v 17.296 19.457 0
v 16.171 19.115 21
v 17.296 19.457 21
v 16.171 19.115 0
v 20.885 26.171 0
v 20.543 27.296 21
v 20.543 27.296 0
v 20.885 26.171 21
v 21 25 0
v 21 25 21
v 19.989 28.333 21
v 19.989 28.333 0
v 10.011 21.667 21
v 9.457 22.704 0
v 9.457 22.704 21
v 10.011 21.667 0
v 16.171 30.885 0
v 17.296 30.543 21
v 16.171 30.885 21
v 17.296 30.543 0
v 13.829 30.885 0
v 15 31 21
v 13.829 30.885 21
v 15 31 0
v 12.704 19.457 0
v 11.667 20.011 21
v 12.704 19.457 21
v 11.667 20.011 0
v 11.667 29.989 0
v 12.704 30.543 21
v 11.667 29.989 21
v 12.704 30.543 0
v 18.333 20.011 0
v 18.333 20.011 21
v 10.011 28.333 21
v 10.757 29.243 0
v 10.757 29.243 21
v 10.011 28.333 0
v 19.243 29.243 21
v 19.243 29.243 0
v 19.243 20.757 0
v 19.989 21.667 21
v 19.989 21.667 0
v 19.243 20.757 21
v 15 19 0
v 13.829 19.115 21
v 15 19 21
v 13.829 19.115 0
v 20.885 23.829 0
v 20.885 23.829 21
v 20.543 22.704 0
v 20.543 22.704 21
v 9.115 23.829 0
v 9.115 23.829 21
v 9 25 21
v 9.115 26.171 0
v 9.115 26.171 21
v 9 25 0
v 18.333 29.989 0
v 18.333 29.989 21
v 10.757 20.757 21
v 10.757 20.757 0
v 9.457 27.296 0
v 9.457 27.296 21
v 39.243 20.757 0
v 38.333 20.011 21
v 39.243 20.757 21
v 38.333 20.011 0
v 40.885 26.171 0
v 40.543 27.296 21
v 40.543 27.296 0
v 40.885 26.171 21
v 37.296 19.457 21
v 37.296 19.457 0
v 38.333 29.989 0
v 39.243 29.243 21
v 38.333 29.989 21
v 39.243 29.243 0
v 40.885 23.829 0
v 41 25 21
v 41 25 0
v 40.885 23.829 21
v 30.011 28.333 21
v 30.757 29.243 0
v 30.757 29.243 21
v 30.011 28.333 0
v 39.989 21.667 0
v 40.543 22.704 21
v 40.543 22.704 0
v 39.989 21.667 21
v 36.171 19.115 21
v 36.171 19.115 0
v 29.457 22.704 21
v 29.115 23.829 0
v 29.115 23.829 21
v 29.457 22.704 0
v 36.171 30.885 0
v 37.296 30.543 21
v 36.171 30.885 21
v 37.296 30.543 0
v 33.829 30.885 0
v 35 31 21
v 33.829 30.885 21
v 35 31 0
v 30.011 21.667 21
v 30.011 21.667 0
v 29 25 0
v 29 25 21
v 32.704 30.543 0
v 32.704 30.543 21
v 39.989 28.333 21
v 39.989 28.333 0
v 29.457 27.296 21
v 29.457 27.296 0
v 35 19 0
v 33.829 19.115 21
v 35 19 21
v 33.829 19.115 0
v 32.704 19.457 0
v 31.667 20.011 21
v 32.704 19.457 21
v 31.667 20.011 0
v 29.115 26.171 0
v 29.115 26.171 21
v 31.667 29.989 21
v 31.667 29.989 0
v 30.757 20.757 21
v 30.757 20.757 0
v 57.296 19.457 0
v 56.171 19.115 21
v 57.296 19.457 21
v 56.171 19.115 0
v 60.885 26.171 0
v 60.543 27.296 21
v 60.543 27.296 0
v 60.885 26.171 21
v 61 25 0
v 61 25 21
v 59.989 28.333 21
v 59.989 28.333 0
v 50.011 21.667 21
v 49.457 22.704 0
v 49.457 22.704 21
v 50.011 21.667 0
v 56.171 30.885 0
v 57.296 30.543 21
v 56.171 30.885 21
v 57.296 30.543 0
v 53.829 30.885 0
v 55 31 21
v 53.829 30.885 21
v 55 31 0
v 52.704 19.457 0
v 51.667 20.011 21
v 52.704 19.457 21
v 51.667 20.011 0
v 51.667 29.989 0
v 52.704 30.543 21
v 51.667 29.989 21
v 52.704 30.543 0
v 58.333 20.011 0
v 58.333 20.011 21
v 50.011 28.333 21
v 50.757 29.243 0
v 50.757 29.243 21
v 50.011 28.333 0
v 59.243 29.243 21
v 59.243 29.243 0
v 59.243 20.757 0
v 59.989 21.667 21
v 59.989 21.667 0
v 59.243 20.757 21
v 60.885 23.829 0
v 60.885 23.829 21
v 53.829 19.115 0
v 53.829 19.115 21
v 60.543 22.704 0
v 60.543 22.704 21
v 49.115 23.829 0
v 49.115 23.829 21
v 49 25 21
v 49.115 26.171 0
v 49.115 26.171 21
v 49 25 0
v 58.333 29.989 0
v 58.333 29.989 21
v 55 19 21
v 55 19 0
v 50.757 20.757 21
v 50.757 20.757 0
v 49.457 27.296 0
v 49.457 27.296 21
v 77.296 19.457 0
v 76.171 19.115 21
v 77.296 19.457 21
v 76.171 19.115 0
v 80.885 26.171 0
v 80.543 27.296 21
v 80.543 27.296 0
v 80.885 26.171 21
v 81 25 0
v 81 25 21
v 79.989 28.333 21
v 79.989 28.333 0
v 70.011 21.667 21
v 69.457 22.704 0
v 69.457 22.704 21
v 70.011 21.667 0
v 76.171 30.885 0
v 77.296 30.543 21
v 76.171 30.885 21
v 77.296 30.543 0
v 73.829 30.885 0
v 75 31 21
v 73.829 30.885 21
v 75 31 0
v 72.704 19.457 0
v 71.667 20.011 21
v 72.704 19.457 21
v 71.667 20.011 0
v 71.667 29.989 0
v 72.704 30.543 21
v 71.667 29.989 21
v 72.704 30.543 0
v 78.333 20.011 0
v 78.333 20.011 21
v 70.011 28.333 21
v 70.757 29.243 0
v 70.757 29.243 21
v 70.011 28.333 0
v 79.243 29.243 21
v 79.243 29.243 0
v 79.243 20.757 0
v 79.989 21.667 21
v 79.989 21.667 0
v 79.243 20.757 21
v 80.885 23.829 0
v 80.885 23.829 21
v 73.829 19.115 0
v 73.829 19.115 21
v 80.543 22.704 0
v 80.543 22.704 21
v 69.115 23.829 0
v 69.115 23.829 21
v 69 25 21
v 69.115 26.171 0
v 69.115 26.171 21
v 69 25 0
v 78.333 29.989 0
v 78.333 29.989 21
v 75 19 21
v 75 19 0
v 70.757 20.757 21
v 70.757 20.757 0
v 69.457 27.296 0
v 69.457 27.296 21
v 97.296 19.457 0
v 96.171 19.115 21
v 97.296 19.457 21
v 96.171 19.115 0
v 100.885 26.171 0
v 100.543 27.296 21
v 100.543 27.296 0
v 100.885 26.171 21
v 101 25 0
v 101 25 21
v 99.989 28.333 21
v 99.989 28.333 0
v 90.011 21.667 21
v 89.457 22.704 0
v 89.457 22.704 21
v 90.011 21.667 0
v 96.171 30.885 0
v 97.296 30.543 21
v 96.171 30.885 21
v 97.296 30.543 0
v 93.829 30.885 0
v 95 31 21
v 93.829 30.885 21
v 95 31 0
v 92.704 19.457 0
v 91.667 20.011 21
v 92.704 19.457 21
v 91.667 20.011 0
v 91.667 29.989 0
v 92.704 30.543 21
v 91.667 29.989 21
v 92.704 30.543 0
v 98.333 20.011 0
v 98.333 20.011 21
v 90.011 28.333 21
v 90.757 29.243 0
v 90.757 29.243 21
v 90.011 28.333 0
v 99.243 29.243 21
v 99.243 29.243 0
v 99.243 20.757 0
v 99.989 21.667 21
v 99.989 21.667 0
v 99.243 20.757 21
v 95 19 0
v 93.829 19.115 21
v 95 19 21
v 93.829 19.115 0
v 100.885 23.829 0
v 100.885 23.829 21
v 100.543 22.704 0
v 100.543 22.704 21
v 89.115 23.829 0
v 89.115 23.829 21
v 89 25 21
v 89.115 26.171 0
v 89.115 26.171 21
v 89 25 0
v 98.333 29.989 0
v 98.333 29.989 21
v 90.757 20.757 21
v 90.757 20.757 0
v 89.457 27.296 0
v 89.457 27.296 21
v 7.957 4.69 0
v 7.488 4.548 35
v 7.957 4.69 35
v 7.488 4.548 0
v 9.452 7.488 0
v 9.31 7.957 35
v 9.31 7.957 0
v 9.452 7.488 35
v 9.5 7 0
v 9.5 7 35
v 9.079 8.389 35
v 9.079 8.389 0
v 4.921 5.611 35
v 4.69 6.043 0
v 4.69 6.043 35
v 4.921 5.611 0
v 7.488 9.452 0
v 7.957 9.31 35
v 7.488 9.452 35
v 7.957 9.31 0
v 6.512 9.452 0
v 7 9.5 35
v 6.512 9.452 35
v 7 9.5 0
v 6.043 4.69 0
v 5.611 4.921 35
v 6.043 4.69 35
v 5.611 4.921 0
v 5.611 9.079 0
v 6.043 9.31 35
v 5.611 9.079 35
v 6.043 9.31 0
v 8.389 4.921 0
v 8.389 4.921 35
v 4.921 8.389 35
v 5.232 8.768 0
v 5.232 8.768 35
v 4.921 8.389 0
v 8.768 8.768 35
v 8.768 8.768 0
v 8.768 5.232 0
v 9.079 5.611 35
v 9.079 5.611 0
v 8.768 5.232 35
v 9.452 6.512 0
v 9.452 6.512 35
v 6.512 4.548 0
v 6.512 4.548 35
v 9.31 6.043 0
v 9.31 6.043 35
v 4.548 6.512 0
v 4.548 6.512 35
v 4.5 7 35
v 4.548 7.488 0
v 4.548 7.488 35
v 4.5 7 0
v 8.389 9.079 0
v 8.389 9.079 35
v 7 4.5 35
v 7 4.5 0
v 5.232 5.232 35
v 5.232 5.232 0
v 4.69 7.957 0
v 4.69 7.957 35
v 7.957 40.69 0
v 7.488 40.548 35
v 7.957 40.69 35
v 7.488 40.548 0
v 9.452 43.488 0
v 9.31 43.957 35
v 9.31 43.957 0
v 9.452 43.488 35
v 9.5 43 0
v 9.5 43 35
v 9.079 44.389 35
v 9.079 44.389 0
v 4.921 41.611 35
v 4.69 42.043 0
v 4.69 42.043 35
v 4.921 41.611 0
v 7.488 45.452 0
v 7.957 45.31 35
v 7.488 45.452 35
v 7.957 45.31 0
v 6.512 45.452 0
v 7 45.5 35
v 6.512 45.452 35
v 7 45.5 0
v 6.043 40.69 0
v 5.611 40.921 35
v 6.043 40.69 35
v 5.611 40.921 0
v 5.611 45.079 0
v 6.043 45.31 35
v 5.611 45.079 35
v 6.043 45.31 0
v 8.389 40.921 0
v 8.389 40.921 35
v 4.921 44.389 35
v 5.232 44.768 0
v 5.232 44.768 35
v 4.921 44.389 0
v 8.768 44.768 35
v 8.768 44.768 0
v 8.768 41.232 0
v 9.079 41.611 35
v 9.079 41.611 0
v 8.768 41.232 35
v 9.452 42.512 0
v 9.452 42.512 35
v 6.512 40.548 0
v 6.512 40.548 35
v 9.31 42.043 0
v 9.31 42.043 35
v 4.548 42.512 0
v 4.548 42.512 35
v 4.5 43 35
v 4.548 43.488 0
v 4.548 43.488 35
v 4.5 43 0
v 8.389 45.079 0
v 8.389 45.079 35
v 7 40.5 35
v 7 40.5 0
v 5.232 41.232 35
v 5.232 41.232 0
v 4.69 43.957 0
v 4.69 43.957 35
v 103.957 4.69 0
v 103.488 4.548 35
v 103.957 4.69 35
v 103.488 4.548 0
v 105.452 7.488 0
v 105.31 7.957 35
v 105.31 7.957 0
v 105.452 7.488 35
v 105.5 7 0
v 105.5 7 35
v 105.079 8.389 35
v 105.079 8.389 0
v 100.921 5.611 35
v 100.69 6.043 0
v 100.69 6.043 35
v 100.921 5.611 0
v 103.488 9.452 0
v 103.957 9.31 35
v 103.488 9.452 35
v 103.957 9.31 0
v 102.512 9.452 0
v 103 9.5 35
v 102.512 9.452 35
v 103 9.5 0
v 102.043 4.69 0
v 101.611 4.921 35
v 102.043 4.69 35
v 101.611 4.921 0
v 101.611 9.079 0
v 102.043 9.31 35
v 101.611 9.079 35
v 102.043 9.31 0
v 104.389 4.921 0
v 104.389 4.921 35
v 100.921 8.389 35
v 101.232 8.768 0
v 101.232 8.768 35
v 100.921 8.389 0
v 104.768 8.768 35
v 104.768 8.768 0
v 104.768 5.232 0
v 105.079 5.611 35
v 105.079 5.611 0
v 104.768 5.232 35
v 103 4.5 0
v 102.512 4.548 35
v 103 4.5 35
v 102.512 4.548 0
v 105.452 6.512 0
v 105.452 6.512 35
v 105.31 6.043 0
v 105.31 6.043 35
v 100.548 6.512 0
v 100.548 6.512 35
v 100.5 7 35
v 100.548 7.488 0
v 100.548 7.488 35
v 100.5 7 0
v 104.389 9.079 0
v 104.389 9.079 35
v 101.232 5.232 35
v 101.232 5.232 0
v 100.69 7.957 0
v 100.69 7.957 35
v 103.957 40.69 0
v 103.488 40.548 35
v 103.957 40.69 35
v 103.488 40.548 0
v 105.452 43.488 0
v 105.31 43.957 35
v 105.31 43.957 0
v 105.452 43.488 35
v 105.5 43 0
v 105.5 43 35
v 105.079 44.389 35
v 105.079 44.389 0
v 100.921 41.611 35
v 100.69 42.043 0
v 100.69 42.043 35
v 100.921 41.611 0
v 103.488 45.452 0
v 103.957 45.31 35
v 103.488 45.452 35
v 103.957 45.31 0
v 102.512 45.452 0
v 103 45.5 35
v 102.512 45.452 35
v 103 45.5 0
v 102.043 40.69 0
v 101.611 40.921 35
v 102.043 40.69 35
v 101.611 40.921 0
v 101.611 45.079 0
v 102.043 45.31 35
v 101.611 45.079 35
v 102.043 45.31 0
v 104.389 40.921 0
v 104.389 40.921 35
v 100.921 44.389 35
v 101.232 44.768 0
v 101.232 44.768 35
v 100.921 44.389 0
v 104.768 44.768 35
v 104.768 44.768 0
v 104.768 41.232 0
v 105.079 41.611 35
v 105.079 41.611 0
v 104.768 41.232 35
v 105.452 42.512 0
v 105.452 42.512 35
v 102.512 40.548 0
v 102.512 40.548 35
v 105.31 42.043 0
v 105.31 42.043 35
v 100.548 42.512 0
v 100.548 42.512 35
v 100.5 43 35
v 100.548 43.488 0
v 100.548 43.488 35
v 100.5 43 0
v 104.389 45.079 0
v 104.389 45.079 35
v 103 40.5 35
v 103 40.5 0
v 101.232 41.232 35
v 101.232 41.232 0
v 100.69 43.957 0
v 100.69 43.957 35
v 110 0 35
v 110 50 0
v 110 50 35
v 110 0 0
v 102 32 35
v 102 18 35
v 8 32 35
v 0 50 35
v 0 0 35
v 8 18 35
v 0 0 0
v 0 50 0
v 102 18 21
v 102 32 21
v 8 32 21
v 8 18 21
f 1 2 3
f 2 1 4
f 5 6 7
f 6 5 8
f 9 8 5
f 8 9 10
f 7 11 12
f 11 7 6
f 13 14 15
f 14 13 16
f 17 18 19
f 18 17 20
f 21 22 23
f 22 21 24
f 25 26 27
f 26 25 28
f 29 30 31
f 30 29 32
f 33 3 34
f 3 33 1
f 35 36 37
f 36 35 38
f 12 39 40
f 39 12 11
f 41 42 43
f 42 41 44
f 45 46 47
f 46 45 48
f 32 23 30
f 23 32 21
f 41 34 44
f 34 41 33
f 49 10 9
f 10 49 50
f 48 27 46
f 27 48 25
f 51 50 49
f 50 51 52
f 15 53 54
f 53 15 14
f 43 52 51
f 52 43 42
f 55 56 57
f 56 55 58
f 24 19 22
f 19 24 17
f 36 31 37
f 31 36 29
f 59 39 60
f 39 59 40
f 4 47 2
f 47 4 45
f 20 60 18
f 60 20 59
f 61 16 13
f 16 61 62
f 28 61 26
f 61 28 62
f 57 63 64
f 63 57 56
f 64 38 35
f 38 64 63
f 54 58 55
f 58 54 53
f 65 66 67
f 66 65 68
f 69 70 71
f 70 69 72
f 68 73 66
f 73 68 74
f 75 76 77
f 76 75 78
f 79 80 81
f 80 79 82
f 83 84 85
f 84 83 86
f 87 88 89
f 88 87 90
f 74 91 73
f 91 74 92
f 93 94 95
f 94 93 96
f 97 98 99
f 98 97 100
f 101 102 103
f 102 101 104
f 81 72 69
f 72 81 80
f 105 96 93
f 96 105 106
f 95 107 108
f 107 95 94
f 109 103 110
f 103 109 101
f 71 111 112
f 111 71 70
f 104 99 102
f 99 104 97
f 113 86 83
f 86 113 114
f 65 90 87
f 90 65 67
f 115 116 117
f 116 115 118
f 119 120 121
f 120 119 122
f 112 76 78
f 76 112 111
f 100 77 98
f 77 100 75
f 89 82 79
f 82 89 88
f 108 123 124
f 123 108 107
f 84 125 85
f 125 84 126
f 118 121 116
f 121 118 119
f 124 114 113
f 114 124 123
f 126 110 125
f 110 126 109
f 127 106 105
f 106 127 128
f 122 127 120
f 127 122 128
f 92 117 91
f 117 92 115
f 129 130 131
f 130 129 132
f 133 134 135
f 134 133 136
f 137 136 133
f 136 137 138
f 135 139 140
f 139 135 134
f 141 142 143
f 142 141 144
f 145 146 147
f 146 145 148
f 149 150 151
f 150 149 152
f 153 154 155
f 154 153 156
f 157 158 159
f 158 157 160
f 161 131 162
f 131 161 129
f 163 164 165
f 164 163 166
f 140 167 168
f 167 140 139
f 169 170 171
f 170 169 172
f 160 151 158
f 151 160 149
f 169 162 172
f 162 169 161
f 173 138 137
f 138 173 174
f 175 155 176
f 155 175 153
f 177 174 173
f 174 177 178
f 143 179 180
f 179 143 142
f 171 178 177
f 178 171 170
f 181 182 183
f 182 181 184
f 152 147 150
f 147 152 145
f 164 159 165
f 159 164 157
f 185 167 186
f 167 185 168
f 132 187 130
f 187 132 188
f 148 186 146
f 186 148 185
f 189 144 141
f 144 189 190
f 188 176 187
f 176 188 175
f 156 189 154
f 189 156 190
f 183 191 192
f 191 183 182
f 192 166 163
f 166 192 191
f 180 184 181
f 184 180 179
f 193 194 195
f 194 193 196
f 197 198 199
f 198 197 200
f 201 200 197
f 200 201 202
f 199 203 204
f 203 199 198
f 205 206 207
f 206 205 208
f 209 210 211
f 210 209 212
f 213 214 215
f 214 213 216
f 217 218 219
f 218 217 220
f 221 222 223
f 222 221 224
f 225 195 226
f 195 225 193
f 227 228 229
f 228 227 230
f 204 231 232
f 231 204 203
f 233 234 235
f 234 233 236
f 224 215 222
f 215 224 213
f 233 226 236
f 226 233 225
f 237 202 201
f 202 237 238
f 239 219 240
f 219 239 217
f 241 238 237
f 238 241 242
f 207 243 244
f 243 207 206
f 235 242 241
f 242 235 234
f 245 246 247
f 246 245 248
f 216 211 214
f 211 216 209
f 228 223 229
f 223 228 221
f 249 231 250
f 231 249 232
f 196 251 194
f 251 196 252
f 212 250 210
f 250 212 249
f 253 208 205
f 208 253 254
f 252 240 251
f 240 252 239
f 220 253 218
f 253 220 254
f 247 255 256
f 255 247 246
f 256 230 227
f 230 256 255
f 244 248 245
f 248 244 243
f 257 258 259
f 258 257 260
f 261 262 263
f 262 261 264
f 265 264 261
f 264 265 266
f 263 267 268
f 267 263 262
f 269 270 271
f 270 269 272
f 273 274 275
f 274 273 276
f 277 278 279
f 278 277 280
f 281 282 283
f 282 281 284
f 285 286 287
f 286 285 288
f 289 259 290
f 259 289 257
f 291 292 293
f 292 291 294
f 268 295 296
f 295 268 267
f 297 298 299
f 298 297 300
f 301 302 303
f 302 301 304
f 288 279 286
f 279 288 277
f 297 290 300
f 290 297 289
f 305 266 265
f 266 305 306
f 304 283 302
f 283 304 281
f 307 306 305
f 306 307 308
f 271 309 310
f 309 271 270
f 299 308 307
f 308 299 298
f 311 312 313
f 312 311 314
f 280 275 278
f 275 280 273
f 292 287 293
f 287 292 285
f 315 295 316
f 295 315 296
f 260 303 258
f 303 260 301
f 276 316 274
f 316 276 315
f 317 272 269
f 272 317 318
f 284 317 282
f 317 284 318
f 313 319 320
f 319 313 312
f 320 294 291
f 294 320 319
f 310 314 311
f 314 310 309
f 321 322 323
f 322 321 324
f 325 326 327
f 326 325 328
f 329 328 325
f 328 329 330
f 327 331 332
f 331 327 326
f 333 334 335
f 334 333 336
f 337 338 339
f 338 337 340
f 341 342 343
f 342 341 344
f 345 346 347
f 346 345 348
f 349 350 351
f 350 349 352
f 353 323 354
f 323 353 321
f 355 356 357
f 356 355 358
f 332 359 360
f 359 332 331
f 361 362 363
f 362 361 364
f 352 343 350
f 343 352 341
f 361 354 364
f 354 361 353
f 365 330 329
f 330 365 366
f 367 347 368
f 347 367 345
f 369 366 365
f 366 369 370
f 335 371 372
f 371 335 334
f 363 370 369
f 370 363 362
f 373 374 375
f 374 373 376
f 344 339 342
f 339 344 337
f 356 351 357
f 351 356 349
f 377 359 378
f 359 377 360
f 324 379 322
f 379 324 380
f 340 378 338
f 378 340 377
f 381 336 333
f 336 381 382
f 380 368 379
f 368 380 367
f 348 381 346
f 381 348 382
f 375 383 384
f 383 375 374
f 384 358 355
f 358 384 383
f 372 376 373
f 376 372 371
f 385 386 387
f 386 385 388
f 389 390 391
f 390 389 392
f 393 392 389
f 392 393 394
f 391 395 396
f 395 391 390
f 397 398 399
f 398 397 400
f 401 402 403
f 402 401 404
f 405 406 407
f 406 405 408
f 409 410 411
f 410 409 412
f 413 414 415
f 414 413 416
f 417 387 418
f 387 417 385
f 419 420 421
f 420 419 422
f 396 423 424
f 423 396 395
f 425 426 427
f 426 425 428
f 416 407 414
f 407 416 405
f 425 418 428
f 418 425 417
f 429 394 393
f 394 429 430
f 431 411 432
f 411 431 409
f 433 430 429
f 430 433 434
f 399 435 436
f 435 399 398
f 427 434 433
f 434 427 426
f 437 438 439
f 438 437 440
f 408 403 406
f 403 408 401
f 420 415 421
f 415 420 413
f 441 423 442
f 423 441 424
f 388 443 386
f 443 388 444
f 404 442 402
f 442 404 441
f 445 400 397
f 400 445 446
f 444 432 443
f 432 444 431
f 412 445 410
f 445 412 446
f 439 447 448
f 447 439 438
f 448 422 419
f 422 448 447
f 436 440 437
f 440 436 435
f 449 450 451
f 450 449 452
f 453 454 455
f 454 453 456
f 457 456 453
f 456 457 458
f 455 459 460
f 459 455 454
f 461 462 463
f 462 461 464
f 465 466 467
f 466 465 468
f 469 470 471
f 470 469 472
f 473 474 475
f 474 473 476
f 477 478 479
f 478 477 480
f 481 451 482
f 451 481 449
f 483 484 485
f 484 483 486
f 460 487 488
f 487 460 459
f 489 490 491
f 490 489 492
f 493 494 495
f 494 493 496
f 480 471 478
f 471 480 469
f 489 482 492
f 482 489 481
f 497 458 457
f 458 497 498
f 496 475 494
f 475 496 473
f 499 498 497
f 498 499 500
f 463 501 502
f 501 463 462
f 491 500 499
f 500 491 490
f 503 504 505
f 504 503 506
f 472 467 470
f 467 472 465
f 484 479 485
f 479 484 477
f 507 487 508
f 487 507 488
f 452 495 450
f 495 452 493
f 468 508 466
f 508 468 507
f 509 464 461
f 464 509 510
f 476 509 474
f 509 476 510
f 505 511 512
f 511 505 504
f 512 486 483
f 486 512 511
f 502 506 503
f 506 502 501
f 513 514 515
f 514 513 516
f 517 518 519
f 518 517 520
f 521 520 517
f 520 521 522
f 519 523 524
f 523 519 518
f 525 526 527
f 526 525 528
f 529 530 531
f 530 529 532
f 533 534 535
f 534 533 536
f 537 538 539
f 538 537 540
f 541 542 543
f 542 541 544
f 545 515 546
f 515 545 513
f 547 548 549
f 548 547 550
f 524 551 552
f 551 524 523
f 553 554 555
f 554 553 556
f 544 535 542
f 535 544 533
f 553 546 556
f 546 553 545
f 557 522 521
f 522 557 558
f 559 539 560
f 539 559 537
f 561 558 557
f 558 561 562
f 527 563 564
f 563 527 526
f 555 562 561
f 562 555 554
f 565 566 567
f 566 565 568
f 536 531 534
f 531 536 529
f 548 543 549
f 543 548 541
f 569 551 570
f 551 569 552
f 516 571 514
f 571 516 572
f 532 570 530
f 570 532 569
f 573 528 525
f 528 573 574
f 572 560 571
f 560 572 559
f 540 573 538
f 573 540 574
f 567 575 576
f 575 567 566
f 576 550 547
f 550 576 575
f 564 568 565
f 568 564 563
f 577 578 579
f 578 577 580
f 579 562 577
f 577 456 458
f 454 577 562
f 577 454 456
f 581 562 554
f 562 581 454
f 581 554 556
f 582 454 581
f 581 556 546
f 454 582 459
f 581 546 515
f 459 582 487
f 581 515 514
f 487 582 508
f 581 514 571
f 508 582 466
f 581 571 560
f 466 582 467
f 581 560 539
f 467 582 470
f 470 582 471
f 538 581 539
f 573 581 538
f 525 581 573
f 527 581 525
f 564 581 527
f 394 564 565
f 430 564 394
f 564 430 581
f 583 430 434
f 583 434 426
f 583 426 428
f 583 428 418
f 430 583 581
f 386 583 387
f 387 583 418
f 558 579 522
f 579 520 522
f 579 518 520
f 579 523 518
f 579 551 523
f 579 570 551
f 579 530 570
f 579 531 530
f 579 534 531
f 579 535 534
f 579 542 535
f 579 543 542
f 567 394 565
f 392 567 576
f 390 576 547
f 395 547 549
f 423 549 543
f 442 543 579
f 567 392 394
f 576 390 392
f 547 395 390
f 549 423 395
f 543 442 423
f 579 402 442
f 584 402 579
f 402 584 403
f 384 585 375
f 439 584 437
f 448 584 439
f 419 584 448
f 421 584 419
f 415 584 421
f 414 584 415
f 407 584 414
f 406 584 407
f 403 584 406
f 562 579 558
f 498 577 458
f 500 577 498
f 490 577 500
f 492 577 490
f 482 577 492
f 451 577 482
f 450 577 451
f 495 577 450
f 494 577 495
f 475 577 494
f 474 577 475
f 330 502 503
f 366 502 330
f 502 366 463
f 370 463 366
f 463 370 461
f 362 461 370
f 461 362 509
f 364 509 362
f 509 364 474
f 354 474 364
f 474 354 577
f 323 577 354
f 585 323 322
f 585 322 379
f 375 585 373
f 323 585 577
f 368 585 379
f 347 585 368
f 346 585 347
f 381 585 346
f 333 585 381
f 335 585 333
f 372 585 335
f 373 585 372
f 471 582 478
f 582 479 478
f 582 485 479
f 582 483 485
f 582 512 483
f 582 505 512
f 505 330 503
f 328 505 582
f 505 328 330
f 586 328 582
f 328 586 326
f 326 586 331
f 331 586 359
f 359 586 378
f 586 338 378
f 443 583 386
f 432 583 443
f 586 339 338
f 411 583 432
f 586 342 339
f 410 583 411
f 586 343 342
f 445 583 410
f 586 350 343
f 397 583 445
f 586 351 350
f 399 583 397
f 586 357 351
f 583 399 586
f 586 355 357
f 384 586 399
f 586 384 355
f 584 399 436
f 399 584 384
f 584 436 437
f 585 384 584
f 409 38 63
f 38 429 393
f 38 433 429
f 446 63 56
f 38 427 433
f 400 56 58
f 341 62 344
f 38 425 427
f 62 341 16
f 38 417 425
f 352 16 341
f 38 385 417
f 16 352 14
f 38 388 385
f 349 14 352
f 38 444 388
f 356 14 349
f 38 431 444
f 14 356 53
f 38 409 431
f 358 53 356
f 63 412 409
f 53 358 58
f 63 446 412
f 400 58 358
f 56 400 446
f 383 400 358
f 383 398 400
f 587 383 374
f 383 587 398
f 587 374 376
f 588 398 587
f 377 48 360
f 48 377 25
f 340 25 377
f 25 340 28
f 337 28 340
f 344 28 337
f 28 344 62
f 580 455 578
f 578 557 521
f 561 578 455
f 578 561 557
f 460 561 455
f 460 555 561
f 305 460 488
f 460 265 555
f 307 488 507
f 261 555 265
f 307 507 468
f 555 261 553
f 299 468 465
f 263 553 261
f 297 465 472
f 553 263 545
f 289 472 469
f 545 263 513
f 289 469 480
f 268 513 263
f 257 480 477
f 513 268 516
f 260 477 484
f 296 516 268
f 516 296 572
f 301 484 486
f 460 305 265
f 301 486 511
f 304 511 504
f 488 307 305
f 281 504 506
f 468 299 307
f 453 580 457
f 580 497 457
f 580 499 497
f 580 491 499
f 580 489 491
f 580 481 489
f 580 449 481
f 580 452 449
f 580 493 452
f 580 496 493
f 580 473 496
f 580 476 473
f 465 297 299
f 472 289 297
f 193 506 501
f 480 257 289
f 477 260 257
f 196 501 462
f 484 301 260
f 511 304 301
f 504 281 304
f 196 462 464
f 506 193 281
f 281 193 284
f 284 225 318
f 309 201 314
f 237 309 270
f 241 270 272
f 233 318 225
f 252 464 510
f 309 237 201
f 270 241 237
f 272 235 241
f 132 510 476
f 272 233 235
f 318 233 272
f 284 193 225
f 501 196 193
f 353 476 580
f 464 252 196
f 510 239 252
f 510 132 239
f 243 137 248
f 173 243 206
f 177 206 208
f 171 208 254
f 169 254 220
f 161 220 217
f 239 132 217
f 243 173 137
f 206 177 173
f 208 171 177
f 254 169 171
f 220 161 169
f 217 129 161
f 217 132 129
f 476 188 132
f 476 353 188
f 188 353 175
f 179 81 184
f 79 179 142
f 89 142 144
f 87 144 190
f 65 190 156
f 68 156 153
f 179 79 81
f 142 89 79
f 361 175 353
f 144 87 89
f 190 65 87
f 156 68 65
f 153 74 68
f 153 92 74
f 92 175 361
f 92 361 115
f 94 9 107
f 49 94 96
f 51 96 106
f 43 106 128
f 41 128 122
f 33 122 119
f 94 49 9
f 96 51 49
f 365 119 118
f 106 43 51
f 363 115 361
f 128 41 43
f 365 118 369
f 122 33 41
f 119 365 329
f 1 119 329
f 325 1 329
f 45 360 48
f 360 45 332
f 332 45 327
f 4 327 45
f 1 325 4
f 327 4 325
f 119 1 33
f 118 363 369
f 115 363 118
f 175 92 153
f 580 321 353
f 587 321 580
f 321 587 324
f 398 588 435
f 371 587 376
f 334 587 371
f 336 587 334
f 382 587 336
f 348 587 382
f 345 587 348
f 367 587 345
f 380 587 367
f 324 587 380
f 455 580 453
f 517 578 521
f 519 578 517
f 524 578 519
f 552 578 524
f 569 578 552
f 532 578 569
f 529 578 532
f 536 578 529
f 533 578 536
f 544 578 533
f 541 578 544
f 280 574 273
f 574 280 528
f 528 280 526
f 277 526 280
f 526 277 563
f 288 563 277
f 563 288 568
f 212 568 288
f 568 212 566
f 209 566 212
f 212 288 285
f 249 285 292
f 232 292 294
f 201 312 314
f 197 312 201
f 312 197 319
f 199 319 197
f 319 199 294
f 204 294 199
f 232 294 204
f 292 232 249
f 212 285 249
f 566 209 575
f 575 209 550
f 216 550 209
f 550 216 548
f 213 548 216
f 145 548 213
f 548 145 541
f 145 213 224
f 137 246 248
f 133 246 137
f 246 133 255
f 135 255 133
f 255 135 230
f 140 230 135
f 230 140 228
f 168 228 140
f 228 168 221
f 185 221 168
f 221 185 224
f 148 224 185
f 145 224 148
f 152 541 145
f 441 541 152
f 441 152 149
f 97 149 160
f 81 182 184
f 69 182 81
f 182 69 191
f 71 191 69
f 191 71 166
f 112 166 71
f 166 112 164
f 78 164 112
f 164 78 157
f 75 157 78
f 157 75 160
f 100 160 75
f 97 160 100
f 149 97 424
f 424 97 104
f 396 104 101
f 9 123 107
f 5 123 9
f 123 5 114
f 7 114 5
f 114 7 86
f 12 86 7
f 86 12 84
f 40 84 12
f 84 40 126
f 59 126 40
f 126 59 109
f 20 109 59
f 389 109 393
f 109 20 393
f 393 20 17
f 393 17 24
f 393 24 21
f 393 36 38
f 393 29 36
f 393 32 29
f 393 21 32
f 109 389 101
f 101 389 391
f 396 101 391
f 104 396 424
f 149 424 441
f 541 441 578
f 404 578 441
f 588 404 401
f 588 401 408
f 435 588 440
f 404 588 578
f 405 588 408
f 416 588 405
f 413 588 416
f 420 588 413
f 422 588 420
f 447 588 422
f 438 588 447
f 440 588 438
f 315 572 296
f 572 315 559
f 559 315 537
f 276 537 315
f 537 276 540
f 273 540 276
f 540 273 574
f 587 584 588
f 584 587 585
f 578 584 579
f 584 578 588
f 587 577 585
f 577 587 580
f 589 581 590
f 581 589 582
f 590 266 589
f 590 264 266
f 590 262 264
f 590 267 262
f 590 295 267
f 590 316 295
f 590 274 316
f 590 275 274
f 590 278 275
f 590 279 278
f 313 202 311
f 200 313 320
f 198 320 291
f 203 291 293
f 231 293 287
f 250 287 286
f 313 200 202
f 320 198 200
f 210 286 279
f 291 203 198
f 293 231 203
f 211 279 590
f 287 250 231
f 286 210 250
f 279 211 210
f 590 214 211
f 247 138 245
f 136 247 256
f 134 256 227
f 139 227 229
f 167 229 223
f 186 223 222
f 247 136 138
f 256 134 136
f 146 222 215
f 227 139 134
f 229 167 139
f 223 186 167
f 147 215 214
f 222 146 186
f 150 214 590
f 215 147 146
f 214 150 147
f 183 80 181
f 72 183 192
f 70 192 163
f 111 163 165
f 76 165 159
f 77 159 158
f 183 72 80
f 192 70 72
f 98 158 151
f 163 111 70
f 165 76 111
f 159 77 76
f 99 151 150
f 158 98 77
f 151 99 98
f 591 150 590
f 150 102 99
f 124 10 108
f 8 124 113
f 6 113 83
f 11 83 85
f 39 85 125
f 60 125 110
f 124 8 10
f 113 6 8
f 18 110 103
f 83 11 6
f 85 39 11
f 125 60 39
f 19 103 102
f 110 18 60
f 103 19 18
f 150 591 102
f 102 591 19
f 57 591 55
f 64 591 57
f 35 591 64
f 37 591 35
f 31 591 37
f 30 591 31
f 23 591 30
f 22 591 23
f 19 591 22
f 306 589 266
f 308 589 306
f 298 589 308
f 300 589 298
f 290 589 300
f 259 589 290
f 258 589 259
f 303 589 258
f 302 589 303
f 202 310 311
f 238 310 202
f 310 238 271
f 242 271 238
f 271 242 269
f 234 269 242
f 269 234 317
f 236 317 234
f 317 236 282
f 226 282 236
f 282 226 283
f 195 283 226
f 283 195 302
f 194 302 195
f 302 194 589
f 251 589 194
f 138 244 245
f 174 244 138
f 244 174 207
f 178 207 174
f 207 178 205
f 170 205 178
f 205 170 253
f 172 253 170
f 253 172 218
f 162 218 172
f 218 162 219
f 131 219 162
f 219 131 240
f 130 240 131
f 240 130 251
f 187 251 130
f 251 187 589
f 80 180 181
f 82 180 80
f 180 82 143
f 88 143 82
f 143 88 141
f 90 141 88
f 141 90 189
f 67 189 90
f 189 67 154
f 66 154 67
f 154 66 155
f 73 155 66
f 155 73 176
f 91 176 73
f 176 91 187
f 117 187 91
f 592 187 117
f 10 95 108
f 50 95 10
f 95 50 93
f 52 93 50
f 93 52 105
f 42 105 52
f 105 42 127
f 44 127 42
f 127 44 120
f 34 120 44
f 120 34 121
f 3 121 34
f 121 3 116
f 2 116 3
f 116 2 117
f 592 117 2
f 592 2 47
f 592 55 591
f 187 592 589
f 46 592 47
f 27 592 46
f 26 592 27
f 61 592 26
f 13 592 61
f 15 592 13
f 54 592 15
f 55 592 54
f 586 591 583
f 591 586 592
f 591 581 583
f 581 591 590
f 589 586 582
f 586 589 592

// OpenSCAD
$fn = 32;

// ----------------------------------------------------------------------
// Manifold block: gallery_top manifold
// ----------------------------------------------------------------------

// --- parameters (mm) ---
block_l = 110;            // block length, X
block_w = 50;             // block width, Y
block_h = 35;             // block height, Z
port_d = 12;              // port bore diameter
port_pitch = 20;          // port pitch along X
gallery_d = 14;           // top gallery width, Y
gallery_depth = 14;       // gallery pocket depth
wall_p = 8;               // gallery end wall thickness, X
mnt_d = 5;                // mounting hole diameter
mnt_in = 7;               // mounting hole inset from the edges

n_ports = 5;  // ports in the row
port_x0 = (block_l - (n_ports - 1) * port_pitch) / 2;  // first port X

difference() {
  cube([block_l, block_w, block_h]);
  for (i = [0 : n_ports - 1])
    translate([port_x0 + i * port_pitch, block_w / 2, -1])
      cylinder(h = block_h + 2, d = port_d);
  translate([wall_p, block_w / 2 - gallery_d / 2, block_h - gallery_depth])
    cube([block_l - 2 * wall_p, gallery_d, gallery_depth + 1]);
  for (cx = [mnt_in, block_l - mnt_in])
    for (cy = [mnt_in, block_w - mnt_in])
      translate([cx, cy, -1]) cylinder(h = block_h + 2, d = mnt_d);
}
